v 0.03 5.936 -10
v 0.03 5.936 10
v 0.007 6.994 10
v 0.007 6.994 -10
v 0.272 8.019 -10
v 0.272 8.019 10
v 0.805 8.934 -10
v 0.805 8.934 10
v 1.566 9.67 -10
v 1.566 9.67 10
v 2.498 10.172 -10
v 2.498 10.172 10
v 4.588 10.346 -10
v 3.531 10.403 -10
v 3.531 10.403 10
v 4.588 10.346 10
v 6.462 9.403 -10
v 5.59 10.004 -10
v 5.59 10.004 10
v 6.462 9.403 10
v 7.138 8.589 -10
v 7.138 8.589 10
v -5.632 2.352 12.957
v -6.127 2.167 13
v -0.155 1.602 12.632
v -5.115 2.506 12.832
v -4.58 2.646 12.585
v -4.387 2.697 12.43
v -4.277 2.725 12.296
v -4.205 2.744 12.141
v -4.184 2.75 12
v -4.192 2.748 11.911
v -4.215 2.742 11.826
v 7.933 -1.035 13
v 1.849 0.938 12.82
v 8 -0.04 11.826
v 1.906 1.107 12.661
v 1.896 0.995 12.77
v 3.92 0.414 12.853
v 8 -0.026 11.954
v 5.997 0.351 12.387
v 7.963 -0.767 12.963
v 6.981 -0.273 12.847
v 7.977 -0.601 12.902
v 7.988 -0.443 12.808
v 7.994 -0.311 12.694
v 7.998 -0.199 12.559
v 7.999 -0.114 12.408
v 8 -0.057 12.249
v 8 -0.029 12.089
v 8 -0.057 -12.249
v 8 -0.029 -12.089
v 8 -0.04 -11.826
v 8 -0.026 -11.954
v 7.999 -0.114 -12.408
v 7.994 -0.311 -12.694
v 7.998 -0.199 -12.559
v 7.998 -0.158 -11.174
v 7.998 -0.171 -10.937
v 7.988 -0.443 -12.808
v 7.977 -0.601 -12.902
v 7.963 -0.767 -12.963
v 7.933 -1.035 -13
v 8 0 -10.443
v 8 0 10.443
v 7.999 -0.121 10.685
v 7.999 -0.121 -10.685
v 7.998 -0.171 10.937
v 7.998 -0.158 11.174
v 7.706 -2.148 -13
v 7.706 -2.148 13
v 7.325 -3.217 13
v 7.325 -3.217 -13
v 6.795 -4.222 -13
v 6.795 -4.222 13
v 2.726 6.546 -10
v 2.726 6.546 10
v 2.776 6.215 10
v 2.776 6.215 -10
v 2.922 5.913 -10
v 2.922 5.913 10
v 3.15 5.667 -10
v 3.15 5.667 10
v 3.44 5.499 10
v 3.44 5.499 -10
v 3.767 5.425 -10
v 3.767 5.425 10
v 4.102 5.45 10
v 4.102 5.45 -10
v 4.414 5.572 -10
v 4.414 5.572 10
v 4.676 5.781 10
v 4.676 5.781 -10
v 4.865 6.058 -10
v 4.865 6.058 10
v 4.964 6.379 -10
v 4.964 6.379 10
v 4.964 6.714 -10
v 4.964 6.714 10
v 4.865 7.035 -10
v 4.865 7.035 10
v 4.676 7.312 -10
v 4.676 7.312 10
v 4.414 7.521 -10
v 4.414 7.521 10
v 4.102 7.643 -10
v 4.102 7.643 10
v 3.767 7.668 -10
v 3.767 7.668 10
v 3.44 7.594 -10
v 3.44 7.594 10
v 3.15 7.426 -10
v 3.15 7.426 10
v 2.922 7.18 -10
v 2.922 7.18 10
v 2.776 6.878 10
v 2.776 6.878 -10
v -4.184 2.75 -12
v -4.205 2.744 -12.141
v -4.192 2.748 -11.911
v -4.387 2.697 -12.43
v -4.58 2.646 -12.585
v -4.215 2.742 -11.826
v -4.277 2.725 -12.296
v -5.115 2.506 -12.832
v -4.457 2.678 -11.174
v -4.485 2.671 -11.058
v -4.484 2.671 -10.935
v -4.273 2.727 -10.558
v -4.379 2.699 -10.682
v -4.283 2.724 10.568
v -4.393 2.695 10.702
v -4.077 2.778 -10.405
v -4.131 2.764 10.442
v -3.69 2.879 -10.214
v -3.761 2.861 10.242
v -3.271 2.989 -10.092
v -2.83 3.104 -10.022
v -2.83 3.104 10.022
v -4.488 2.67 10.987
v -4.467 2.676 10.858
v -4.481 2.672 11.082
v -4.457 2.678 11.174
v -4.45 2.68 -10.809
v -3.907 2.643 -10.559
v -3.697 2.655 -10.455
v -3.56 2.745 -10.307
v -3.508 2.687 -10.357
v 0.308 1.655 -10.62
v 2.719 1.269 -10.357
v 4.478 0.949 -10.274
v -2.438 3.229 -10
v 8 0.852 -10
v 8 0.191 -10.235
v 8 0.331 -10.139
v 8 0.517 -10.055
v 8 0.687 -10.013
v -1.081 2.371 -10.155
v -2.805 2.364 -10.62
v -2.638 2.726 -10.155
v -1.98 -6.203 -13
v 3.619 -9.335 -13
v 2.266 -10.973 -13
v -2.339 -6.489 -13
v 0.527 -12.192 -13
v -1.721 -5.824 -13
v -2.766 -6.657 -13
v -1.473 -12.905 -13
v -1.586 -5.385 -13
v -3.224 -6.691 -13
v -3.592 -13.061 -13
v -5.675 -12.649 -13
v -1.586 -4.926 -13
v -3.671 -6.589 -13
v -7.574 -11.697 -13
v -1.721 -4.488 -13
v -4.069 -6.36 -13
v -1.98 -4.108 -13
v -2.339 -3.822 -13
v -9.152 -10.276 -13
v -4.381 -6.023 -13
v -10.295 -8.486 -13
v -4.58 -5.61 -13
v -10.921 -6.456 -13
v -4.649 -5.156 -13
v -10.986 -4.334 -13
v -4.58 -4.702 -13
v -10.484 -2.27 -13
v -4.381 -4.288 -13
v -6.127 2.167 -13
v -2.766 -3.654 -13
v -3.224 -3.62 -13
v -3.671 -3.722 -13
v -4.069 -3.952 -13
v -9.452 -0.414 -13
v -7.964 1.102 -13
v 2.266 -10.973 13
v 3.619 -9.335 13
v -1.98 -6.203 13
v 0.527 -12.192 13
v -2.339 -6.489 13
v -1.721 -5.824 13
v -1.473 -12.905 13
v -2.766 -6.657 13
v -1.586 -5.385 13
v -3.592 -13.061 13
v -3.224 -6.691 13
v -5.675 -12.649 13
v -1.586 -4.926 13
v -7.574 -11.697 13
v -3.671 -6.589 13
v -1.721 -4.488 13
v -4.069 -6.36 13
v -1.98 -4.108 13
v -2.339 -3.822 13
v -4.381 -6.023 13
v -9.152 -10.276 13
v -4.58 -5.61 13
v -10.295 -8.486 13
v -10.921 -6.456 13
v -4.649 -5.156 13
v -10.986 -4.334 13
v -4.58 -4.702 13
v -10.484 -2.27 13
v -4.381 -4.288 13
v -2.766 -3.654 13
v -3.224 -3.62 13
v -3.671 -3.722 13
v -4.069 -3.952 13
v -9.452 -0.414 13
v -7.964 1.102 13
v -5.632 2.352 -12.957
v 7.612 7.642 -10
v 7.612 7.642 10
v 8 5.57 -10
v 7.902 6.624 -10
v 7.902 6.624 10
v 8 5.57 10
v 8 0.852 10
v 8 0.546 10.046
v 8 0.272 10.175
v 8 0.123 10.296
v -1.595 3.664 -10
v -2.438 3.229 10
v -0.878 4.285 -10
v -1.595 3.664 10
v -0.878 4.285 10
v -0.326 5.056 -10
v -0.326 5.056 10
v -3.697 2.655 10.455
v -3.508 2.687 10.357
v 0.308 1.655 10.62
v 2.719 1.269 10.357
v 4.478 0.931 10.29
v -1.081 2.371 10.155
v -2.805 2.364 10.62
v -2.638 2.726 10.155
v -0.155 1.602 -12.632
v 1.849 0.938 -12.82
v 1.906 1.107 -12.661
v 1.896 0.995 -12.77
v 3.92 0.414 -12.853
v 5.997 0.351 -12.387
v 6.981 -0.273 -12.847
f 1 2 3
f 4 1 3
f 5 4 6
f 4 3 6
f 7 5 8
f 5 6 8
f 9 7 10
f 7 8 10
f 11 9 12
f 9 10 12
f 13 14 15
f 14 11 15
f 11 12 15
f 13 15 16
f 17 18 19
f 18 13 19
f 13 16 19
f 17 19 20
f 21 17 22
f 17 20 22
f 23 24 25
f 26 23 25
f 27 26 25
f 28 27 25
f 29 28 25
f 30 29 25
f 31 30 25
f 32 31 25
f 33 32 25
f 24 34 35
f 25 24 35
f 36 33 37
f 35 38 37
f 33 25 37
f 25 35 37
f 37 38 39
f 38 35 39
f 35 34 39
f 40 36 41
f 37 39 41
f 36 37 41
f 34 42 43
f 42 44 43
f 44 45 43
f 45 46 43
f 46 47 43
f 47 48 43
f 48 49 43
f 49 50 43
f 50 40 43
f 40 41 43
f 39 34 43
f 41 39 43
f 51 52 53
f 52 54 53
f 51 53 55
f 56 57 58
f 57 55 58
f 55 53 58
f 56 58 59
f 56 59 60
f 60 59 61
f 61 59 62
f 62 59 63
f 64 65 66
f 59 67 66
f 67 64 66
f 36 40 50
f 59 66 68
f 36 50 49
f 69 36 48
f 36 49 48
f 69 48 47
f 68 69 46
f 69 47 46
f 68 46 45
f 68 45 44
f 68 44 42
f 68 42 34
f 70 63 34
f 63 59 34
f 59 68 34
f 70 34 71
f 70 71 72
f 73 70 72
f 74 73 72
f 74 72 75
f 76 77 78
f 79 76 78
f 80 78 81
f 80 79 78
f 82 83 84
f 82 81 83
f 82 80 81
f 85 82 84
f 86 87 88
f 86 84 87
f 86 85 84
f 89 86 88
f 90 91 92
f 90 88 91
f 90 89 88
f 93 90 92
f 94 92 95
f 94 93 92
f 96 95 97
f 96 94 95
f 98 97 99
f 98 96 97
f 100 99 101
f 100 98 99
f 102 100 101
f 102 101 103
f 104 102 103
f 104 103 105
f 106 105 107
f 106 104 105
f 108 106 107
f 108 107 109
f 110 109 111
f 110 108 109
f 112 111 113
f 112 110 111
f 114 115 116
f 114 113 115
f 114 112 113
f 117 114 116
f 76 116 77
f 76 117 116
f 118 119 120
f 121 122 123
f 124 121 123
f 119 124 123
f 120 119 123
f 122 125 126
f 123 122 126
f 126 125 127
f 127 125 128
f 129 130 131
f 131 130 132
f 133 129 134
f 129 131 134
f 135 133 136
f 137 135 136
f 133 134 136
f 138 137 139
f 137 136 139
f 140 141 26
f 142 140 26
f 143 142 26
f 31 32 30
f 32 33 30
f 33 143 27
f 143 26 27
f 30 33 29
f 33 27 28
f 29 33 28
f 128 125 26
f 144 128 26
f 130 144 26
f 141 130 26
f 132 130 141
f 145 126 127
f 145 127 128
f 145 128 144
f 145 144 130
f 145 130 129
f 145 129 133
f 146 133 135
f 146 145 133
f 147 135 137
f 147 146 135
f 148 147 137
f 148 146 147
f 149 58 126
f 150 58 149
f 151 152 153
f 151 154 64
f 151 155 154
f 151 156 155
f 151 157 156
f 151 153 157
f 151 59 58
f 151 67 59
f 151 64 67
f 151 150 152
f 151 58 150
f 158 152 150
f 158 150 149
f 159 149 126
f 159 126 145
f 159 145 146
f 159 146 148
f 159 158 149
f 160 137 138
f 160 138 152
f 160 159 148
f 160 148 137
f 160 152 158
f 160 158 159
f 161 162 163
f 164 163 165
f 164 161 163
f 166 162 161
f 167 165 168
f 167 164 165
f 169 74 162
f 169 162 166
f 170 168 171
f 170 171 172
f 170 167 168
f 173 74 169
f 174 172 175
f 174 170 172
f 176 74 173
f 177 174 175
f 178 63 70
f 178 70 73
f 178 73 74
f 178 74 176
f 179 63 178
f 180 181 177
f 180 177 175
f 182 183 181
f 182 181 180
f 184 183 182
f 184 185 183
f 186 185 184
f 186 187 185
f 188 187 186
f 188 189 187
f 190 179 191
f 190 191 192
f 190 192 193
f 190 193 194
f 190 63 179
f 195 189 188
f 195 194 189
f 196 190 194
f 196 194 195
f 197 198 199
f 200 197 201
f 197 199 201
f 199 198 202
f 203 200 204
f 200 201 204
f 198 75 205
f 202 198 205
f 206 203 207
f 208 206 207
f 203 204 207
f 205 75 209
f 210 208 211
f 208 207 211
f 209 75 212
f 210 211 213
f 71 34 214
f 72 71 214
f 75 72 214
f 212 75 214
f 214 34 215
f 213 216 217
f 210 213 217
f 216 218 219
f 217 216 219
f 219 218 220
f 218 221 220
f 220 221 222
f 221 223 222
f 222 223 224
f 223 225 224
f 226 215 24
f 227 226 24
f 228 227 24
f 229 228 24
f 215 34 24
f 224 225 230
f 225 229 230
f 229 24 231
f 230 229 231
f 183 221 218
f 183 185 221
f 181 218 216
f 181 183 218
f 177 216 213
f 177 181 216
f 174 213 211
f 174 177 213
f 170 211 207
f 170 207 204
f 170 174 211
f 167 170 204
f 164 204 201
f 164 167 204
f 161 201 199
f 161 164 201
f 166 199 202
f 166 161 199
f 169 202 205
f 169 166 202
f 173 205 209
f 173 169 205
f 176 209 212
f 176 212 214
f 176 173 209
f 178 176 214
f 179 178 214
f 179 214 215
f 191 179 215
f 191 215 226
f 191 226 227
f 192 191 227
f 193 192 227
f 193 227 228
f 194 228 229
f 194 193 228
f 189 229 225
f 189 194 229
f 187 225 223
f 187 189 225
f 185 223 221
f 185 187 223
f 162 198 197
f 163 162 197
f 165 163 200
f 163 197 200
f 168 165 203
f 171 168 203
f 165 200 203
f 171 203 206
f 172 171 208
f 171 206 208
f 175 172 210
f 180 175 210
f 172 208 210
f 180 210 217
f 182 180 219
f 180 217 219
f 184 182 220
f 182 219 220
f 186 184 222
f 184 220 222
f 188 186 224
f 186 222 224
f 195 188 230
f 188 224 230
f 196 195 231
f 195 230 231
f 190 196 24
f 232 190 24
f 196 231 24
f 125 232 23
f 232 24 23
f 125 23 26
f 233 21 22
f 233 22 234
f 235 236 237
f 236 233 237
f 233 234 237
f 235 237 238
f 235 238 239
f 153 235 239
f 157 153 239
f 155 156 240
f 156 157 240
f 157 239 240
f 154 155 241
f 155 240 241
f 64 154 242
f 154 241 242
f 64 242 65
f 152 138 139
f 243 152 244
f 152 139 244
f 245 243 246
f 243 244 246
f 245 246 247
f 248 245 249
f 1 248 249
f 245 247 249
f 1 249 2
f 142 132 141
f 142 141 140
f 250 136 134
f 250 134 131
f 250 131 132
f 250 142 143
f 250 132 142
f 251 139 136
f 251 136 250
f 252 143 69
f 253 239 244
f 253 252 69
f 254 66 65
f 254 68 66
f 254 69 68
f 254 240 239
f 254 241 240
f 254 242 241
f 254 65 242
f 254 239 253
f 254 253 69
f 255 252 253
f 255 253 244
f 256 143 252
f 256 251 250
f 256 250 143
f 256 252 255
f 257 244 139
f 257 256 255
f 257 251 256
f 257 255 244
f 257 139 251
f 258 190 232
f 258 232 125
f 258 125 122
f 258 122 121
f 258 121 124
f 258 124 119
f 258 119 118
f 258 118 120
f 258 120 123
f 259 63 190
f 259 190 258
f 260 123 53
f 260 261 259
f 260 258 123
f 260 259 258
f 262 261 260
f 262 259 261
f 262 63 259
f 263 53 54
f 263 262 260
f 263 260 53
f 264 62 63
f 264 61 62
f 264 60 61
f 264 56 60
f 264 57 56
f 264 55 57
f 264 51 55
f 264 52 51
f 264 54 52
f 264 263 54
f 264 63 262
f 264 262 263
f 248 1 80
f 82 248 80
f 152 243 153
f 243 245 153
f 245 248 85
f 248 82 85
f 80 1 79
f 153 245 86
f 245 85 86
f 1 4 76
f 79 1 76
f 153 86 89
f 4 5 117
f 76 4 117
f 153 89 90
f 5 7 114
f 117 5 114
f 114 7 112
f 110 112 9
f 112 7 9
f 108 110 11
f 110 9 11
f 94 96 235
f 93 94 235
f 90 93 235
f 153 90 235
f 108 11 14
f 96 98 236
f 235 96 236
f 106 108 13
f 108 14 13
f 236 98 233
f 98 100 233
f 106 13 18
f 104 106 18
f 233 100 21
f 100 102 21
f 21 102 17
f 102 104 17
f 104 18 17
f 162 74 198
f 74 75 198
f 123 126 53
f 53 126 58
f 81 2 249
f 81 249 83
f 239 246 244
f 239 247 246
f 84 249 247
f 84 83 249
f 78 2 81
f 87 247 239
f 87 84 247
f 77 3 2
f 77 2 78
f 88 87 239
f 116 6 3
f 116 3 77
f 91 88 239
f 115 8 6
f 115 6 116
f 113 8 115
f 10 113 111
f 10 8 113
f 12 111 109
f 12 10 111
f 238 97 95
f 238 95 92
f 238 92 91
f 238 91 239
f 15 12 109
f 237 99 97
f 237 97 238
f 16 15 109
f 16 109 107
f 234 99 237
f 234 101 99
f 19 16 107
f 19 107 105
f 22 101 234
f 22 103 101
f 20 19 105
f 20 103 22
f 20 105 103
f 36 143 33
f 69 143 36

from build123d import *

# Parameters (mm, degrees)
SKETCH1_R           = 1.125
SKETCH1_R_2         = 1.54
BOSS_EXTRUDE1_DEPTH = 13
SKETCH2_R           = 1.125
CUT_EXTRUDE1_DEPTH  = 3
CUT_EXTRUDE1_TAPER  = -10
FILLET1_R           = 1
FILLET2_R           = 1
FILLET3_R           = 1
FILLET4_R           = 1


with BuildPart() as part:
    # Sketch1 → Boss-Extrude1 (new, symmetric)
    with BuildSketch(Plane.XY):
        with BuildLine():
            Line((8, 5.57), (8, 0))
            ThreePointArc((8, 0), (7.692956073, -2.195091538), (6.795393285, -4.221685695))
            Line((6.795393285, -4.221685695), (3.618574799, -9.335219142))
            ThreePointArc((3.618574799, -9.335219142), (-9.482620111, -9.856988447), (-5.1153336, 2.505873673))
            Line((-5.1153336, 2.505873673), (-2.830230063, 3.104309401))
            ThreePointArc((-2.830230063, 3.104309401), (-1.020355645, 4.136406118), (0.029802368, 5.93586081))
            ThreePointArc((0.029802368, 5.93586081), (2.498115044, 10.172124839), (7.138397607, 8.589001937))
            ThreePointArc((7.138397607, 8.589001937), (7.780383364, 7.13977159), (8, 5.57))
        make_face()
        with Locations(Location((3.85133489, 6.546425452, 0), (0, 0, 180))):
            Circle(SKETCH1_R, mode=Mode.SUBTRACT)
        with Locations(Location((-3.108864553, -5.155750304, 0), (0, 0, 180))):
            Circle(SKETCH1_R_2, mode=Mode.SUBTRACT)
    extrude(amount=BOSS_EXTRUDE1_DEPTH, both=True)

    # Sketch2 → Cut-Extrude1 (cut)
    with BuildSketch(Plane.XY.offset(13)):
        with BuildLine():
            Line((8, 0.172124839), (8, 5.57))
            ThreePointArc((8, 5.57), (7.780383364, 7.13977159), (7.138397607, 8.589001937))
            ThreePointArc((7.138397607, 8.589001937), (2.498115044, 10.172124839), (0.029802368, 5.93586081))
            ThreePointArc((0.029802368, 5.93586081), (-1.020355645, 4.136406118), (-2.830230063, 3.104309401))
            Line((-2.830230063, 3.104309401), (-3.781962396, 2.855064401))
            Line((-3.781962396, 2.855064401), (8, 0.172124839))
        make_face()
        with Locations(Location((3.85133489, 6.546425452, 0), (0, 0, 180))):
            Circle(SKETCH2_R, mode=Mode.SUBTRACT)
    cut_extrude1 = extrude(amount=-CUT_EXTRUDE1_DEPTH, taper=CUT_EXTRUDE1_TAPER, mode=Mode.SUBTRACT)

    # Mirror1: Cut-Extrude1 across plane
    add(cut_extrude1.mirror(Plane.XY), mode=Mode.SUBTRACT)

    # Fillet1
    fillet1_edges = [part.edges().sort_by_distance(p)[0] for p in [
        (2.109018802, 1.51359462, -13),
    ]]
    fillet(fillet1_edges, radius=FILLET1_R)

    # Fillet2
    fillet2_edges = [part.edges().sort_by_distance(p)[0] for p in [
        (2.109018802, 1.51359462, 13),
    ]]
    fillet(fillet2_edges, radius=FILLET2_R)

    # Fillet3
    fillet3_edges = [part.edges().sort_by_distance(p)[0] for p in [
        (1.550728698, 1.09820349, -10),
    ]]
    fillet(fillet3_edges, radius=FILLET3_R)

    # Fillet4
    fillet4_edges = [part.edges().sort_by_distance(p)[0] for p in [
        (1.550728698, 1.09820349, 10),
    ]]
    fillet(fillet4_edges, radius=FILLET4_R)


solid = part.part
